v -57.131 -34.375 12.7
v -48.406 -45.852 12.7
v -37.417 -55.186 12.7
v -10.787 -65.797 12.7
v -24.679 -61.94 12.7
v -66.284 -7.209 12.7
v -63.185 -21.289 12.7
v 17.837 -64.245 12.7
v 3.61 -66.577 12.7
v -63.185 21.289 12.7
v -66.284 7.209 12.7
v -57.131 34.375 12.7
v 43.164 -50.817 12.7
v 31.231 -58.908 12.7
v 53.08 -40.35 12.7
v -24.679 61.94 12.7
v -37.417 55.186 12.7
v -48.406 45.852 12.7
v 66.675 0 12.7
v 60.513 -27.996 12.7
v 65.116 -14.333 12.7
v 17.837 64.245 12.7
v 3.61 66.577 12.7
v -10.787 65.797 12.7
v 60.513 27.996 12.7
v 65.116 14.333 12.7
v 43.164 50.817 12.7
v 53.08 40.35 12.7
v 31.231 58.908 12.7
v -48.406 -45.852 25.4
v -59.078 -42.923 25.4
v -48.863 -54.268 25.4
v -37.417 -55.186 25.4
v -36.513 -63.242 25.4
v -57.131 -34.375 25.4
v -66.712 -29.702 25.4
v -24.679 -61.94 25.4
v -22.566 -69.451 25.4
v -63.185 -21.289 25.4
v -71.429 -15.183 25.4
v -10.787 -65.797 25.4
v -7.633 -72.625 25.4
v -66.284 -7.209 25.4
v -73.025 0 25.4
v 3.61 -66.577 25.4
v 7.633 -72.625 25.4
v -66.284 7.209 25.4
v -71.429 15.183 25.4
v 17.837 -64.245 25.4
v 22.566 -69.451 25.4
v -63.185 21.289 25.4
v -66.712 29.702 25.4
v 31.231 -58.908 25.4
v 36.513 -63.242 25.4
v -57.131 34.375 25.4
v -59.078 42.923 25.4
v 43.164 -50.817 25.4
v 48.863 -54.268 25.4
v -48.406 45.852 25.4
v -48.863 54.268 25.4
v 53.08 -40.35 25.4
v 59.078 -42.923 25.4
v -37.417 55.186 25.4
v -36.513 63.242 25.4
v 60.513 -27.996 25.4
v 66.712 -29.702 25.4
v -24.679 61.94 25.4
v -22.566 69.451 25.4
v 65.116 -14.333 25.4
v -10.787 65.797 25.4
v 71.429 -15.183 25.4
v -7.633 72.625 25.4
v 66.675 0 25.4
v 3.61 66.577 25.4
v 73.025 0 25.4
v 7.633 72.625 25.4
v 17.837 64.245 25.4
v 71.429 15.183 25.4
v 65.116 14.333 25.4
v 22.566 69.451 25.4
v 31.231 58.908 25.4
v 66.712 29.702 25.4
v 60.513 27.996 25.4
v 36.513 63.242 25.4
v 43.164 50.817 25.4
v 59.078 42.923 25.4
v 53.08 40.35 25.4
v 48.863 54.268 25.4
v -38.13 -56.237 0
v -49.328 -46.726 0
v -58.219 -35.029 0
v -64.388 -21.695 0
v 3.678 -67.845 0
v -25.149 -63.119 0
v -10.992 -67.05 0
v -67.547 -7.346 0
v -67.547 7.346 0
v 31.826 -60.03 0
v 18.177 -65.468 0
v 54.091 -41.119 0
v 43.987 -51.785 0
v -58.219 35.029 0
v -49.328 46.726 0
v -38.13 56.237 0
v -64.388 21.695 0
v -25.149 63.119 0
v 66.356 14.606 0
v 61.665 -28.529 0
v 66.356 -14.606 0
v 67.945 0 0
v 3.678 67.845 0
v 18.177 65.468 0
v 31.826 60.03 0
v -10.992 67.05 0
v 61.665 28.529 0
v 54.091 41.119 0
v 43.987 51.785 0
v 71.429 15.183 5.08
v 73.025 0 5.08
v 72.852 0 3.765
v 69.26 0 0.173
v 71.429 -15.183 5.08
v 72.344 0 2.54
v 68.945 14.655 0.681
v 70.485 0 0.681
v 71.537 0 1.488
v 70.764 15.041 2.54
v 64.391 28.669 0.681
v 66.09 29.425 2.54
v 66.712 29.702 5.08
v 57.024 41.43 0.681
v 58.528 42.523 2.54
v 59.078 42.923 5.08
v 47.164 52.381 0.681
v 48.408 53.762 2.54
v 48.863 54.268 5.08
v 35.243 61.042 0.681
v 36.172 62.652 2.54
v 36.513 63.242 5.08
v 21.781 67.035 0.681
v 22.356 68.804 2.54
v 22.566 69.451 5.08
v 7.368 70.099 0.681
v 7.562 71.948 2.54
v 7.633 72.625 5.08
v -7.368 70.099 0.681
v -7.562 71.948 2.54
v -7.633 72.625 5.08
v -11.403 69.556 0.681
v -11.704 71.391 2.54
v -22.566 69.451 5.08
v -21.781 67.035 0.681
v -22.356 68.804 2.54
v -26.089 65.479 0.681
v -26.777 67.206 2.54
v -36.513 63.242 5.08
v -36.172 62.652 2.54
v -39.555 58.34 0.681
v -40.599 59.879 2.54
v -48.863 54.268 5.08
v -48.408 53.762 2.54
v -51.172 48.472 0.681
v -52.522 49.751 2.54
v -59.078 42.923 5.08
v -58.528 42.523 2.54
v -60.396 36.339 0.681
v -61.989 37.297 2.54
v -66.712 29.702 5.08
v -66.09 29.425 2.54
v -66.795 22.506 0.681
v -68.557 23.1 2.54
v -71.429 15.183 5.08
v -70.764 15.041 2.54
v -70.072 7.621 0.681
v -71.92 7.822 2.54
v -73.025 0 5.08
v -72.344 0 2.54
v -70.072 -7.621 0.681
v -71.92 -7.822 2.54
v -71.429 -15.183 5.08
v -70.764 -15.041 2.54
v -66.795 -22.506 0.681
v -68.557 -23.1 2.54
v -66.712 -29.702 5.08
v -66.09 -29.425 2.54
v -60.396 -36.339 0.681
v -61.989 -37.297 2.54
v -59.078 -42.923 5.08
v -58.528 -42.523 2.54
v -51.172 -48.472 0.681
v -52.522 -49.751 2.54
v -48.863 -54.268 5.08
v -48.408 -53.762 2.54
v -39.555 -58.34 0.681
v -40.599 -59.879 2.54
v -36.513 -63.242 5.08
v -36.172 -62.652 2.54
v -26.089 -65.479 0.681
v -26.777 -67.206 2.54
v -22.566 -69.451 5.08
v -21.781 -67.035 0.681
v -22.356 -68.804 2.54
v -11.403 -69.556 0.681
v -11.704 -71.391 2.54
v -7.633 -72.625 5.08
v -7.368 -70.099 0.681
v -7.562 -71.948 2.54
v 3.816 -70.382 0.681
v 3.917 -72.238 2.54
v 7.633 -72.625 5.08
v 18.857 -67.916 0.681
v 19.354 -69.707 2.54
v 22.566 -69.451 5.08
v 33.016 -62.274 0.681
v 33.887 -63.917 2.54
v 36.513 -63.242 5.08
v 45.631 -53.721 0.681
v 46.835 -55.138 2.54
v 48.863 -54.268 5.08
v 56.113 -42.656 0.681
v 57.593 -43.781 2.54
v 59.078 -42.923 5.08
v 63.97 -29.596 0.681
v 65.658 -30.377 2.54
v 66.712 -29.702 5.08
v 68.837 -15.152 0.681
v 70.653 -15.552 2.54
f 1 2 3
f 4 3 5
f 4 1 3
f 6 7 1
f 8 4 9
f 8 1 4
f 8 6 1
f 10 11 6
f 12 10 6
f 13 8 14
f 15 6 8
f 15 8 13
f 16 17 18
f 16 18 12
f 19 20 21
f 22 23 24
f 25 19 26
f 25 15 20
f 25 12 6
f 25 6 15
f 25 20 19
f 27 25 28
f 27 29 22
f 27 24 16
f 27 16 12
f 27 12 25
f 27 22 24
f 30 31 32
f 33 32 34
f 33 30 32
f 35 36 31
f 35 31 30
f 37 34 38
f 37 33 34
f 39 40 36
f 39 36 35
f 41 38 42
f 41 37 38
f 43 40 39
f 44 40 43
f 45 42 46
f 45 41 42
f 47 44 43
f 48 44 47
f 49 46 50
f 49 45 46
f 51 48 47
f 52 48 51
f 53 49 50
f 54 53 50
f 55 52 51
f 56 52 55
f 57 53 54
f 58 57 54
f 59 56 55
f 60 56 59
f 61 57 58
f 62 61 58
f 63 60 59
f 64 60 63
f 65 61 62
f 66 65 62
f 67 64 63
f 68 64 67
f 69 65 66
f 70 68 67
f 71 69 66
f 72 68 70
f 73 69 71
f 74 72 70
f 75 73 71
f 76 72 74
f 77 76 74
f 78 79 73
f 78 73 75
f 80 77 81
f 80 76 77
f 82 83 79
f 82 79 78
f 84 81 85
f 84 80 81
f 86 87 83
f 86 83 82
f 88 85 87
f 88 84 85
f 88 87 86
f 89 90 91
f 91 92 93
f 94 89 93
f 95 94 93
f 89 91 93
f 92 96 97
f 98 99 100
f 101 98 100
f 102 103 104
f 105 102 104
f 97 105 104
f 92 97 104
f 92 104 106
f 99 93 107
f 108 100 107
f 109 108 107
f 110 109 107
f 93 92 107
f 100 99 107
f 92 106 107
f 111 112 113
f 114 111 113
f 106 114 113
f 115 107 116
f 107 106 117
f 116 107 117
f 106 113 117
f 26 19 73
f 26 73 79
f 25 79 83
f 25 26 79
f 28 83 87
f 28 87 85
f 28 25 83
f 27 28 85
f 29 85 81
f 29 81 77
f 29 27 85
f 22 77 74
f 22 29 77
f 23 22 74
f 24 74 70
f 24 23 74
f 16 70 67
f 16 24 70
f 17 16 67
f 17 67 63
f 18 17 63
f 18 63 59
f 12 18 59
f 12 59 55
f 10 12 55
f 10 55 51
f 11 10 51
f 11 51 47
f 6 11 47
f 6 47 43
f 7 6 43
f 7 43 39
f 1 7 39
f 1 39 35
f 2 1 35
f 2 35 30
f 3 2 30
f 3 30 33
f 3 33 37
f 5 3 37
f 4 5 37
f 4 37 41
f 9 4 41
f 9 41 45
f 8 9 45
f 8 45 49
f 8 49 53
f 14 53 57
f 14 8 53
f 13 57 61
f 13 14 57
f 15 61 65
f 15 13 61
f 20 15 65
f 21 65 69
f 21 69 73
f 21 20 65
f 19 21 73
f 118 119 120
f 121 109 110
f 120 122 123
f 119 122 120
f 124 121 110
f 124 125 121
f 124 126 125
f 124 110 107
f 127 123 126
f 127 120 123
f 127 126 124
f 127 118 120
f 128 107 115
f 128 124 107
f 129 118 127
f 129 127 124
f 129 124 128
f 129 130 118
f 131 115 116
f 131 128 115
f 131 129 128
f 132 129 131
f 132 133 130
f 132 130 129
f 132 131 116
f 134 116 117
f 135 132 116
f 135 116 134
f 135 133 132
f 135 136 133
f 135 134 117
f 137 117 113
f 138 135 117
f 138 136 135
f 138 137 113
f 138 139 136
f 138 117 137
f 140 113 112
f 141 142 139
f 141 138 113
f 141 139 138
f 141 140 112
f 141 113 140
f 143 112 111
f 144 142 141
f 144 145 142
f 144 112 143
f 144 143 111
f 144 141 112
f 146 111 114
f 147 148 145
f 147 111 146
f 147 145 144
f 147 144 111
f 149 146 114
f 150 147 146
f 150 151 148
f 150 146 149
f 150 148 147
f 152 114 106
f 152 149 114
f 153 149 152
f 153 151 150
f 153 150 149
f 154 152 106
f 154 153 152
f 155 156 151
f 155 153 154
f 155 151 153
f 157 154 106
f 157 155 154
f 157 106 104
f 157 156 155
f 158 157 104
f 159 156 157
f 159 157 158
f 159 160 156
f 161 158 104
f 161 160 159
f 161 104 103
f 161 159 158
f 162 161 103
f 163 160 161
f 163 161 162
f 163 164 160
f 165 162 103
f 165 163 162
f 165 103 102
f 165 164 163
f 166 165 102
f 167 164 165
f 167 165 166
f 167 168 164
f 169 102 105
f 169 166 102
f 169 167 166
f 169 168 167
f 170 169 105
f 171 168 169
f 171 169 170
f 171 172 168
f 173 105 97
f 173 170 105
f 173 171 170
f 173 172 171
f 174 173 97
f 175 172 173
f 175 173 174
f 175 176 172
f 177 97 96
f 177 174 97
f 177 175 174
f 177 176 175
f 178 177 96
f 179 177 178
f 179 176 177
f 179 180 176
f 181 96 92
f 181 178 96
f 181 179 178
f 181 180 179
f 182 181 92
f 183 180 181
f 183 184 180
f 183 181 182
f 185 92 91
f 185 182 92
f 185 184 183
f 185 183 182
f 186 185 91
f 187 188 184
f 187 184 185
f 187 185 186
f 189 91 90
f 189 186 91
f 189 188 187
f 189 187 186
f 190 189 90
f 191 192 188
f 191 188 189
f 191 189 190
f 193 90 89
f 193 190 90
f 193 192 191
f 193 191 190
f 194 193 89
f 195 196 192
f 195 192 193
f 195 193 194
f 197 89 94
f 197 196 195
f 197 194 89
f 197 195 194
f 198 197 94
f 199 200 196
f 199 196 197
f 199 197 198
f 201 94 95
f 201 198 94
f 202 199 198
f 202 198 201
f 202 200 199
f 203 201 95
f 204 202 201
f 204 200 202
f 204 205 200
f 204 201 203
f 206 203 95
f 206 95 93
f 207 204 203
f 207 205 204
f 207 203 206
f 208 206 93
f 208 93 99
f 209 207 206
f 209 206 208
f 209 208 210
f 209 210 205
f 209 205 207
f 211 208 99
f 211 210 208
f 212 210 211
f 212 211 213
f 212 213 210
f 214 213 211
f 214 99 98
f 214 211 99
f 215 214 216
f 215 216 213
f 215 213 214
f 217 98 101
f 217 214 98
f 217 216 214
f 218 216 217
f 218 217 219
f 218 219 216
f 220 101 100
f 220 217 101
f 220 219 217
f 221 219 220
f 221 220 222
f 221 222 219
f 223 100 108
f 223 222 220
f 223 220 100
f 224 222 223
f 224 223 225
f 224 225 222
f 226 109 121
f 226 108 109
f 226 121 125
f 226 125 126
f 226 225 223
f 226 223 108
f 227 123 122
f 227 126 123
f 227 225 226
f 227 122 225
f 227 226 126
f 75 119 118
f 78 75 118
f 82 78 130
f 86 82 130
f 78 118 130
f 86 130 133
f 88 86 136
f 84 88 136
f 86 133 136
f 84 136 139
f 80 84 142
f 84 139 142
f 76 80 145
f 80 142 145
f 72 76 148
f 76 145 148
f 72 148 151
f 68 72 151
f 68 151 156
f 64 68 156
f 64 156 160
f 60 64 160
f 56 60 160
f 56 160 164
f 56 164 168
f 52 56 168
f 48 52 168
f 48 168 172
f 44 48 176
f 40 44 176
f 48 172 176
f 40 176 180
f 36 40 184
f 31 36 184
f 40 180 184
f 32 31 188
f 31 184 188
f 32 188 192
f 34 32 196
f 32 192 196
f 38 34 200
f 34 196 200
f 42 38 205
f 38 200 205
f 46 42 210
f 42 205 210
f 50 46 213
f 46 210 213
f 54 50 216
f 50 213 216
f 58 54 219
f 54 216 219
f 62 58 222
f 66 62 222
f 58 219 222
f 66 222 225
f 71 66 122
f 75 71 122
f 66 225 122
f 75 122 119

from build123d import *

# Parameters (mm, degrees)
F0_R     = 73.025
F0_R_2   = 66.675
F1_DEPTH = 25.4
F2_R     = 66.675
F3_DEPTH = 12.7
F4_R     = 5.08


with BuildPart() as f1:
    # F0 (on Top) → F1 (new body)
    with BuildSketch(Plane.XY):
        Circle(F0_R)
        Circle(F0_R_2, mode=Mode.SUBTRACT)
    extrude(amount=F1_DEPTH)

    # F2 (on Top) → F3 (join)
    with BuildSketch(Plane.XY):
        Circle(F2_R)
    extrude(amount=F3_DEPTH)

    # F4
    f4_edges = [f1.edges().sort_by_distance(p)[0] for p in [
        (-73.025, 0, 0),
    ]]
    fillet(f4_edges, radius=F4_R)


solid = f1.part
